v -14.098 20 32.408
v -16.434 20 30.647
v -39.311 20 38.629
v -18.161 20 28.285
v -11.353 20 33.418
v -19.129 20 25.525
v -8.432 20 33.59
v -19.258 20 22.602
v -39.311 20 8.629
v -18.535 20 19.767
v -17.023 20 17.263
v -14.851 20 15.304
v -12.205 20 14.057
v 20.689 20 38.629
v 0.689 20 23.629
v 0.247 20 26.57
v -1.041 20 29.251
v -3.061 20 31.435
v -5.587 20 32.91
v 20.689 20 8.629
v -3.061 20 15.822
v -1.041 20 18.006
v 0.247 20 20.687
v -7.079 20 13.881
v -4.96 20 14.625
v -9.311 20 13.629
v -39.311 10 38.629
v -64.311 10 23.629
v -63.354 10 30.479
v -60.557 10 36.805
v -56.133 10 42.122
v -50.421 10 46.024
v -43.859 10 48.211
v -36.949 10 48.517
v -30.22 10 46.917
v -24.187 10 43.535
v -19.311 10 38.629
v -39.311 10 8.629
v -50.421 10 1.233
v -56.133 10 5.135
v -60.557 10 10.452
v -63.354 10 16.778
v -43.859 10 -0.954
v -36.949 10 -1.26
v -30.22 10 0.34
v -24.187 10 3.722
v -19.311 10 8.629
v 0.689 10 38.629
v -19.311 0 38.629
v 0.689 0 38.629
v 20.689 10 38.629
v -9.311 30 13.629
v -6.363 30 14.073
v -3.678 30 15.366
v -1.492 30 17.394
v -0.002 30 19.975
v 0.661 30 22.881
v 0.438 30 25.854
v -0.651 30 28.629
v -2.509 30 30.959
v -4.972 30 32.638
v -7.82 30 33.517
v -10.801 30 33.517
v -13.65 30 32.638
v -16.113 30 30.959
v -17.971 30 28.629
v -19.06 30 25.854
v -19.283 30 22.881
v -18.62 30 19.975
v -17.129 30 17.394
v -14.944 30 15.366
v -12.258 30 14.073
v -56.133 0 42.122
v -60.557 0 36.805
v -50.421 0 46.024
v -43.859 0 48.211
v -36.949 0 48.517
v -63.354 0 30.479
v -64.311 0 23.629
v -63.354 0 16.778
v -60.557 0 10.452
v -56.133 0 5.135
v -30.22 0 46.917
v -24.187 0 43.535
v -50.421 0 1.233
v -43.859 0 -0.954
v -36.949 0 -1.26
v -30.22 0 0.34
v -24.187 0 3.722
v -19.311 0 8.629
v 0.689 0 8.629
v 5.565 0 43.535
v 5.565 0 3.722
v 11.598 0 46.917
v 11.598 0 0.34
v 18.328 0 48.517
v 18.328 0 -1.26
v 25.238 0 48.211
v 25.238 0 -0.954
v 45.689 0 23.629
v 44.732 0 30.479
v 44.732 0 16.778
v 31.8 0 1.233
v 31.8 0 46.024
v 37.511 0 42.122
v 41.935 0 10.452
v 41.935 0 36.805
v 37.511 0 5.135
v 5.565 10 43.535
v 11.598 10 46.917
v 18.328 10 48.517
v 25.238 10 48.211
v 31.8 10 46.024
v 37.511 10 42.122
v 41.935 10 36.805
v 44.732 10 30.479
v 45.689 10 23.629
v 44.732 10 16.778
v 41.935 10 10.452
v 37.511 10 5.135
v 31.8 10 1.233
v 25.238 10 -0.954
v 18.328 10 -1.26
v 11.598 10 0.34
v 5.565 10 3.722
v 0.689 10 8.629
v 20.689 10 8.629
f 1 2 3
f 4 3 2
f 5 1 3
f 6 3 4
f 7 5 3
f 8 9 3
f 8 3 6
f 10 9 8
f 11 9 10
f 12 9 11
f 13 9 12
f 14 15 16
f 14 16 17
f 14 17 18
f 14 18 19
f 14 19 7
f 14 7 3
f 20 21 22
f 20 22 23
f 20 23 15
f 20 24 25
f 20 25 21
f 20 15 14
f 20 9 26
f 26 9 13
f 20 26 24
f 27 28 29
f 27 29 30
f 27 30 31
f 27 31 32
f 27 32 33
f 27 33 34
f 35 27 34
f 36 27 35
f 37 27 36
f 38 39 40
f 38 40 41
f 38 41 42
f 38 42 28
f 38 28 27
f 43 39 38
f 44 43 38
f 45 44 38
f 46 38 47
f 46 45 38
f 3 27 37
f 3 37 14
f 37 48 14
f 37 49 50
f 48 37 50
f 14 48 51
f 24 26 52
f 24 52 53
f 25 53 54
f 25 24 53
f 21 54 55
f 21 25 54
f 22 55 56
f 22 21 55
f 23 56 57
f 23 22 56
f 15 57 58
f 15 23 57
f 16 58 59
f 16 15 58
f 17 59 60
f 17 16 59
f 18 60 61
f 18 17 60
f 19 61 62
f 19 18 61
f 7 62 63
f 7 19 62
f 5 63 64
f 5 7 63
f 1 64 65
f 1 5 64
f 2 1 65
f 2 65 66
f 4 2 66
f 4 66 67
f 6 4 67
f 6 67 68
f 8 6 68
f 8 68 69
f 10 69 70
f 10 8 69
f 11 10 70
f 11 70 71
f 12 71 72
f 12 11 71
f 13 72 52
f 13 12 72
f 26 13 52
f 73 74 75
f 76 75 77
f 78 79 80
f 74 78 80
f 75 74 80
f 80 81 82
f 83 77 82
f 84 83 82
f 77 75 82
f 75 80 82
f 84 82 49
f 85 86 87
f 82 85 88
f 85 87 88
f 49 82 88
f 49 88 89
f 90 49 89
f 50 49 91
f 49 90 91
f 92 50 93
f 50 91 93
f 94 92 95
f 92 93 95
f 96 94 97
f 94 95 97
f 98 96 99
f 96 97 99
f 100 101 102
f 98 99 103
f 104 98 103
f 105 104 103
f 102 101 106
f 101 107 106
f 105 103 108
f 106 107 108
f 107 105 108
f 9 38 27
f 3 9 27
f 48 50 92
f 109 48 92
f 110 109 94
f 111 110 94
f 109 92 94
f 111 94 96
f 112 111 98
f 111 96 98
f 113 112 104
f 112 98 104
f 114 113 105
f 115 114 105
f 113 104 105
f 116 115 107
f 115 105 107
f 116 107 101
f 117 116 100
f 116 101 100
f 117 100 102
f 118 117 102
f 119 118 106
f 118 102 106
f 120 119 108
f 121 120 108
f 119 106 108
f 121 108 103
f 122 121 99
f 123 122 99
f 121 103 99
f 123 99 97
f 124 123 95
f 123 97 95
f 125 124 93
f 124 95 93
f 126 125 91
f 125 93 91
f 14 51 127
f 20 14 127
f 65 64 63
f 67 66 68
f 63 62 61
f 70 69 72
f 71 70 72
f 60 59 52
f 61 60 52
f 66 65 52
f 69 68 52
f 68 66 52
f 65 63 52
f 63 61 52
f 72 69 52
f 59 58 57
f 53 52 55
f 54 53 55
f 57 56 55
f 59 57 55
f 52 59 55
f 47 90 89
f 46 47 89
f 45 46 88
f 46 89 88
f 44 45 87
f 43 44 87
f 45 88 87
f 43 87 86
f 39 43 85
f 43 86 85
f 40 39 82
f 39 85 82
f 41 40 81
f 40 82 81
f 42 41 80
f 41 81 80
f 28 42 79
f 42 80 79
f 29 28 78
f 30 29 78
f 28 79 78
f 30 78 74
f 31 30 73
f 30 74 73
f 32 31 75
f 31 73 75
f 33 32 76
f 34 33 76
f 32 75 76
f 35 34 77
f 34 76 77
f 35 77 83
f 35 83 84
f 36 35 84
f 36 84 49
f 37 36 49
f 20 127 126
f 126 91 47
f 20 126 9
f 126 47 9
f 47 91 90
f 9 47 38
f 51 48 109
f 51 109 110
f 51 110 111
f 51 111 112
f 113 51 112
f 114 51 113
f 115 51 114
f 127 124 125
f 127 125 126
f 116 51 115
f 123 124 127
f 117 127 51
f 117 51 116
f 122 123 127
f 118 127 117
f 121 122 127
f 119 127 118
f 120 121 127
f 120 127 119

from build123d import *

# Parameters (mm, degrees)
EXTRUDE_1_DEPTH   = 10
EXTRUDE_1_2_DEPTH = 10
SKETCH_1_3_W      = 60
SKETCH_1_3_H      = 30
SKETCH_1_3_R      = 10
EXTRUDE_2_DEPTH   = 20
SKETCH_7_R        = 10
EXTRUDE_4_DEPTH   = 30


with BuildPart() as part:
    # 스케치1 → 보스-돌출1 (new body)
    with BuildSketch(Plane(origin=(0, 0, 0), x_dir=(1, 0, 0), z_dir=(0, 1, 0))):
        with BuildLine():
            Line((20.689216343, -8.628600134), (20.689216343, -38.628600134))
            Line((20.689216343, -38.628600134), (0.689216343, -38.628600134))
            ThreePointArc((0.689216343, -38.628600134), (45.689216343, -23.628600134), (0.689216343, -8.628600134))
            Line((0.689216343, -8.628600134), (20.689216343, -8.628600134))
        make_face()
    extrude(amount=EXTRUDE_1_DEPTH)



with BuildPart() as body_2:
    # 스케치1 → Extrude 1 2 (new body)
    with BuildSketch(Plane(origin=(0, 0, 0), x_dir=(1, 0, 0), z_dir=(0, 1, 0))):
        with BuildLine():
            ThreePointArc((-19.310783657, -8.628600134), (-64.310783657, -23.628600134), (-19.310783657, -38.628600134))
            Line((-19.310783657, -38.628600134), (-39.310783657, -38.628600134))
            Line((-39.310783657, -38.628600134), (-39.310783657, -8.628600134))
            Line((-39.310783657, -8.628600134), (-19.310783657, -8.628600134))
        make_face()
    extrude(amount=EXTRUDE_1_2_DEPTH)


with BuildPart() as part_1:
    add(part.part)

    add(body_2.part)  # 보스-돌출2 merges body 2
    # 스케치1<3> → 보스-돌출2 (add)
    with BuildSketch(Plane(origin=(0, 0, 0), x_dir=(1, 0, 0), z_dir=(0, 1, 0))):
        with Locations((-9.310783657, -23.628600134)):
            Rectangle(SKETCH_1_3_W, SKETCH_1_3_H)
        with Locations((-9.310783657, -23.628600134)):
            Circle(SKETCH_1_3_R, mode=Mode.SUBTRACT)
    extrude(amount=EXTRUDE_2_DEPTH)

    # 스케치7 → 보스-돌출4 (add)
    with BuildSketch(Plane.XZ):
        with Locations((-9.310783657, 23.628600134)):
            Circle(SKETCH_7_R)
    extrude(amount=-EXTRUDE_4_DEPTH)


solid = part_1.part
